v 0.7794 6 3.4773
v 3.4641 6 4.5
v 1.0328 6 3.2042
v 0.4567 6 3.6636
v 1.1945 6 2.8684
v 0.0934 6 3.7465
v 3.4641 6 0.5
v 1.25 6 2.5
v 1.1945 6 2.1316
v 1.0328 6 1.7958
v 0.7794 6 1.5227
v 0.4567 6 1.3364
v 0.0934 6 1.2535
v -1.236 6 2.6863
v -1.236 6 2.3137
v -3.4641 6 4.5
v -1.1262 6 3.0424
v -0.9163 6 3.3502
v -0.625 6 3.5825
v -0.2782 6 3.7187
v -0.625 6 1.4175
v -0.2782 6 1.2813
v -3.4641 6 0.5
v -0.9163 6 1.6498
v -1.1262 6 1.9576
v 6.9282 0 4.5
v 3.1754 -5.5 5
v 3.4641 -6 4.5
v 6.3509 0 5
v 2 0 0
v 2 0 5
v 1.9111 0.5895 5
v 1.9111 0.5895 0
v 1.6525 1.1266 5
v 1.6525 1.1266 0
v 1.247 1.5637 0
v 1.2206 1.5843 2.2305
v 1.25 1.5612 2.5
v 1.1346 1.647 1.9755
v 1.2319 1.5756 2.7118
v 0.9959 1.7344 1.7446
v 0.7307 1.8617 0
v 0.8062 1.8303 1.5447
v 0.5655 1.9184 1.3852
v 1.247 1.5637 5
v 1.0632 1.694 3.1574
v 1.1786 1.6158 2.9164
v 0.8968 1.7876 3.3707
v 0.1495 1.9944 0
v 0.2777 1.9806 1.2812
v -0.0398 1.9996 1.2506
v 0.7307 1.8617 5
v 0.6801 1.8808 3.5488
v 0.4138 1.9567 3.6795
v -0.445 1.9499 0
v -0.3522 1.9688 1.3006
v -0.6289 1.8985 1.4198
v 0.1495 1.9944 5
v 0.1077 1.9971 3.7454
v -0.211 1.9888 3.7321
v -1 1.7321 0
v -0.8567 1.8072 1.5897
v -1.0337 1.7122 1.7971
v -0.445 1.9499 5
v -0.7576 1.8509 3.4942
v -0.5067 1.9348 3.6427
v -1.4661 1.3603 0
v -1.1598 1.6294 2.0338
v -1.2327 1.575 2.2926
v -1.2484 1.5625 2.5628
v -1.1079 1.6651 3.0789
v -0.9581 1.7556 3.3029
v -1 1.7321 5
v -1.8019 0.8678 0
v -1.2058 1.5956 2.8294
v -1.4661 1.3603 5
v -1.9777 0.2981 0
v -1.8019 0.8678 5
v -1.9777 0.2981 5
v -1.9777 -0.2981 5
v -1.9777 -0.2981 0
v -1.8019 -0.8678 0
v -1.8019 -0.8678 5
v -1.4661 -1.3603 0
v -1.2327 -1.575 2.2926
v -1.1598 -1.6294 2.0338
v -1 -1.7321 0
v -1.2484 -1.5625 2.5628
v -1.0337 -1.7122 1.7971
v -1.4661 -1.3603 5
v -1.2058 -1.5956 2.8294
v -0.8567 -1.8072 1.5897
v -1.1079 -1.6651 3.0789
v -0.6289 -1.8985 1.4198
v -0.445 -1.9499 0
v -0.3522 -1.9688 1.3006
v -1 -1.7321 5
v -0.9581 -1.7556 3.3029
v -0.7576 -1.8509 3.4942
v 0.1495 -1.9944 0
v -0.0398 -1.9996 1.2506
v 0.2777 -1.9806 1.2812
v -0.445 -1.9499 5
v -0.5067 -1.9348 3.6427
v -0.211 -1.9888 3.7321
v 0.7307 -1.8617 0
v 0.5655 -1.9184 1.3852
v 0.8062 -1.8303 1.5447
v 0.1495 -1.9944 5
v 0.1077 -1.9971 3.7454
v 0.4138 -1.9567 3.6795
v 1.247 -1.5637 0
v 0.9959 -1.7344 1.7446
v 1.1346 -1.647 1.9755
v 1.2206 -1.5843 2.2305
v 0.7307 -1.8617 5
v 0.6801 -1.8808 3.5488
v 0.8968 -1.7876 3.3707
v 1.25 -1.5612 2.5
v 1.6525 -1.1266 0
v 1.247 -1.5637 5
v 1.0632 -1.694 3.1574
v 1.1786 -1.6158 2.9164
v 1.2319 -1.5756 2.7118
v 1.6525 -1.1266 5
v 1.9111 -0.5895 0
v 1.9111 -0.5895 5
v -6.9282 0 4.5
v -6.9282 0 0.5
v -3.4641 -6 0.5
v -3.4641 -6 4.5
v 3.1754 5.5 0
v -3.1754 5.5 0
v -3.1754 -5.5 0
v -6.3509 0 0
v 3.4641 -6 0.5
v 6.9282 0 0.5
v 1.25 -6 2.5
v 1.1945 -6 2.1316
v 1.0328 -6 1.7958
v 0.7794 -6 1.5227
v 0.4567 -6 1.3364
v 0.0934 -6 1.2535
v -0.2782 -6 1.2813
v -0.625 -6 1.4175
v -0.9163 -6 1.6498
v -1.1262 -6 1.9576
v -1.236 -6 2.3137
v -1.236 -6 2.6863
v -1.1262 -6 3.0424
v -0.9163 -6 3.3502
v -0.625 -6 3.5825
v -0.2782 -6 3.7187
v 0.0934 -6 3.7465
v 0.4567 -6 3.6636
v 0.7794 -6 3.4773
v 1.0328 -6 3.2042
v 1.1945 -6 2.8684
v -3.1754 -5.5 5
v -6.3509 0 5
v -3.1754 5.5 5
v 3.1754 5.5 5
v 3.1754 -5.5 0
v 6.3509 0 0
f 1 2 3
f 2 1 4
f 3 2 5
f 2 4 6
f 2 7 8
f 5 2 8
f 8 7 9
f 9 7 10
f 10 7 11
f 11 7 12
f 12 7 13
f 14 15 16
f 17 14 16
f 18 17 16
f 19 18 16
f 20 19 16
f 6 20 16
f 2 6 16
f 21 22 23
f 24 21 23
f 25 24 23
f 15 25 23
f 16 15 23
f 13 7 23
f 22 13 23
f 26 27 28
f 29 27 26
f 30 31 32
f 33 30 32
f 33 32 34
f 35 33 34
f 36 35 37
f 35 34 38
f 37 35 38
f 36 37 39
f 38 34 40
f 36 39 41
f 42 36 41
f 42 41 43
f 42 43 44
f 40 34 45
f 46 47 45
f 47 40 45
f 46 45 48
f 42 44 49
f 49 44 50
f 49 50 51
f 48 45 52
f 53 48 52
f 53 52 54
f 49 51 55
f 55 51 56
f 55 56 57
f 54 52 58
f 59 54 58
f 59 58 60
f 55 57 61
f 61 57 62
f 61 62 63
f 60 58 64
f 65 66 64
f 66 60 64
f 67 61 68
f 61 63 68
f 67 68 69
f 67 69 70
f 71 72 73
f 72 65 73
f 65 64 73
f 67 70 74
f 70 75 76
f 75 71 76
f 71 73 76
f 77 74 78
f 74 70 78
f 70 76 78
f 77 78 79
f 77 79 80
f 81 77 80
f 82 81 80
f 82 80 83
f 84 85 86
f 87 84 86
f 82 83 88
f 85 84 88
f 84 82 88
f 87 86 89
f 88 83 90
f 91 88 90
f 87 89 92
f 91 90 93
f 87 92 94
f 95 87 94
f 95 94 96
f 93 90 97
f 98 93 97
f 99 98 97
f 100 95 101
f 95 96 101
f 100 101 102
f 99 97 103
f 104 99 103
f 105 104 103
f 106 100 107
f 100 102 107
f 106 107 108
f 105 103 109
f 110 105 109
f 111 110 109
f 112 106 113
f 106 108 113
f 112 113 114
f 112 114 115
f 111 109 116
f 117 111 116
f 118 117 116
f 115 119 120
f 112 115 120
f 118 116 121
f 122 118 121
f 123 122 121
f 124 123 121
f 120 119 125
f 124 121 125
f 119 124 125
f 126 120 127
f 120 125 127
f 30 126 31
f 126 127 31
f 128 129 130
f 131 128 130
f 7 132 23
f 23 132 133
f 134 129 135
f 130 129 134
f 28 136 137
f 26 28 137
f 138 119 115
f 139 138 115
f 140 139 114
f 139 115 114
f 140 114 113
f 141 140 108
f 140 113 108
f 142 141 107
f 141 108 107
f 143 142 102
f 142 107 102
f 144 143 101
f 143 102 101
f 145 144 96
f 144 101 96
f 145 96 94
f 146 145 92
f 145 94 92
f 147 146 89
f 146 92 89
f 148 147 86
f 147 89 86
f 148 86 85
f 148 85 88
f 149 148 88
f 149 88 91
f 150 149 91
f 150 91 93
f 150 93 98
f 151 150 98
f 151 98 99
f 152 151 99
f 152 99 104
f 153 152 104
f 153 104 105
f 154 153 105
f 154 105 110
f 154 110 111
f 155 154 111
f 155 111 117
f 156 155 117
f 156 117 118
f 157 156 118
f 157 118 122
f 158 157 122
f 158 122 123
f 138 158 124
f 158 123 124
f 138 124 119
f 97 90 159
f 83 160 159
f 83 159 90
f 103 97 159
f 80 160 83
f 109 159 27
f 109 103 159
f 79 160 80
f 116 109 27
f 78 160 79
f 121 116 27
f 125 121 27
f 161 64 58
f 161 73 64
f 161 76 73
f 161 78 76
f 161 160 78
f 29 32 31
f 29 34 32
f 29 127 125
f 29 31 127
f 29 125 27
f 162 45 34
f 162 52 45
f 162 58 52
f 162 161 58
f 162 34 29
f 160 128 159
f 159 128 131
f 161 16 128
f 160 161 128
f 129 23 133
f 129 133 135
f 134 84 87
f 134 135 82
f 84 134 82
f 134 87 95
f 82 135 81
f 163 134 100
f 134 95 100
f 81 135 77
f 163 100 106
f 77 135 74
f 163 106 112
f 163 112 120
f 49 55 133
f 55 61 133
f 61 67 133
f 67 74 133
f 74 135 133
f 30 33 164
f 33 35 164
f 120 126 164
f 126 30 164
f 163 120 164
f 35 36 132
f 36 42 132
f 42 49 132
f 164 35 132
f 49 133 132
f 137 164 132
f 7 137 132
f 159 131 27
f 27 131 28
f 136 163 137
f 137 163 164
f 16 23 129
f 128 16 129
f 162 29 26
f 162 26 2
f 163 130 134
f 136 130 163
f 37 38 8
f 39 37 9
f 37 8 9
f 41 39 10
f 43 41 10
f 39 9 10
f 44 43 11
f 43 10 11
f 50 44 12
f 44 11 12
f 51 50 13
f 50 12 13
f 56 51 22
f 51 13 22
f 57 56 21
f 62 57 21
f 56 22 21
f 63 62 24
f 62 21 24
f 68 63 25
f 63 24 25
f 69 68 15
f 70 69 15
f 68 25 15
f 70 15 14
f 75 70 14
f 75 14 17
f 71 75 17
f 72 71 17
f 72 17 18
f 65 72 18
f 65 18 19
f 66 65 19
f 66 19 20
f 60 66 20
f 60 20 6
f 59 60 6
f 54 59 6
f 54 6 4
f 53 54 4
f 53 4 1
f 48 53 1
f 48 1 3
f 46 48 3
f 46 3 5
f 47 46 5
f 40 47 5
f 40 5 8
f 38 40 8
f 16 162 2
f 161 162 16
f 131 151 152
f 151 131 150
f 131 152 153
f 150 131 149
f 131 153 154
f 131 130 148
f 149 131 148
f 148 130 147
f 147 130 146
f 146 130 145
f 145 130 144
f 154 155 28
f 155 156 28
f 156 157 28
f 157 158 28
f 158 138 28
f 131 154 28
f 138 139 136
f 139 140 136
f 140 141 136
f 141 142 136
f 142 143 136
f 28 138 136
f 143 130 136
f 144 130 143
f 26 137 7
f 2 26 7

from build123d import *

# Parameters (mm, degrees)
SALIENTE_EXTRUIR1_DEPTH = 5
CROQUIS2_R              = 2
CORTAR_EXTRUIR1_DEPTH   = 5
CHAFL_N1_SIZE           = 0.5
CROQUIS3_R              = 1.25
CORTAR_EXTRUIR2_DEPTH   = 13


with BuildPart() as part:
    # Croquis1 → Saliente-Extruir1 (new body)
    with BuildSketch(Plane.XY):
        Polygon((6.92820323, 0), (3.464101615, 6), (-3.464101615, 6), (-6.92820323, 0), (-3.464101615, -6), (3.464101615, -6), align=None)
    extrude(amount=SALIENTE_EXTRUIR1_DEPTH)

    # Croquis2 → Cortar-Extruir1 (cut)
    with BuildSketch(Plane.XY.offset(5)):
        Circle(CROQUIS2_R)
    extrude(amount=-CORTAR_EXTRUIR1_DEPTH, mode=Mode.SUBTRACT)

    # Chaflán1
    chafl_n1_edges = [part.edges().sort_by_distance(p)[0] for p in [
        (0, 6, 5),
        (-5.196152423, 3, 5),
        (-5.196152423, -3, 5),
        (0, -6, 5),
        (5.196152423, -3, 5),
        (0, -6, 0),
        (-5.196152423, -3, 0),
        (-5.196152423, 3, 0),
        (5.196152423, 3, 5),
        (0, 6, 0),
        (5.196152423, 3, 0),
        (5.196152423, -3, 0),
    ]]
    chamfer(chafl_n1_edges, length=CHAFL_N1_SIZE)

    # Croquis3 → Cortar-Extruir2 (cut, through all)
    with BuildSketch(Plane(origin=(0, 6, 0), x_dir=(1, 0, 0), z_dir=(0, 1, 0))):
        with Locations((0, -2.5)):
            Circle(CROQUIS3_R)
    extrude(amount=-CORTAR_EXTRUIR2_DEPTH, mode=Mode.SUBTRACT)


solid = part.part
